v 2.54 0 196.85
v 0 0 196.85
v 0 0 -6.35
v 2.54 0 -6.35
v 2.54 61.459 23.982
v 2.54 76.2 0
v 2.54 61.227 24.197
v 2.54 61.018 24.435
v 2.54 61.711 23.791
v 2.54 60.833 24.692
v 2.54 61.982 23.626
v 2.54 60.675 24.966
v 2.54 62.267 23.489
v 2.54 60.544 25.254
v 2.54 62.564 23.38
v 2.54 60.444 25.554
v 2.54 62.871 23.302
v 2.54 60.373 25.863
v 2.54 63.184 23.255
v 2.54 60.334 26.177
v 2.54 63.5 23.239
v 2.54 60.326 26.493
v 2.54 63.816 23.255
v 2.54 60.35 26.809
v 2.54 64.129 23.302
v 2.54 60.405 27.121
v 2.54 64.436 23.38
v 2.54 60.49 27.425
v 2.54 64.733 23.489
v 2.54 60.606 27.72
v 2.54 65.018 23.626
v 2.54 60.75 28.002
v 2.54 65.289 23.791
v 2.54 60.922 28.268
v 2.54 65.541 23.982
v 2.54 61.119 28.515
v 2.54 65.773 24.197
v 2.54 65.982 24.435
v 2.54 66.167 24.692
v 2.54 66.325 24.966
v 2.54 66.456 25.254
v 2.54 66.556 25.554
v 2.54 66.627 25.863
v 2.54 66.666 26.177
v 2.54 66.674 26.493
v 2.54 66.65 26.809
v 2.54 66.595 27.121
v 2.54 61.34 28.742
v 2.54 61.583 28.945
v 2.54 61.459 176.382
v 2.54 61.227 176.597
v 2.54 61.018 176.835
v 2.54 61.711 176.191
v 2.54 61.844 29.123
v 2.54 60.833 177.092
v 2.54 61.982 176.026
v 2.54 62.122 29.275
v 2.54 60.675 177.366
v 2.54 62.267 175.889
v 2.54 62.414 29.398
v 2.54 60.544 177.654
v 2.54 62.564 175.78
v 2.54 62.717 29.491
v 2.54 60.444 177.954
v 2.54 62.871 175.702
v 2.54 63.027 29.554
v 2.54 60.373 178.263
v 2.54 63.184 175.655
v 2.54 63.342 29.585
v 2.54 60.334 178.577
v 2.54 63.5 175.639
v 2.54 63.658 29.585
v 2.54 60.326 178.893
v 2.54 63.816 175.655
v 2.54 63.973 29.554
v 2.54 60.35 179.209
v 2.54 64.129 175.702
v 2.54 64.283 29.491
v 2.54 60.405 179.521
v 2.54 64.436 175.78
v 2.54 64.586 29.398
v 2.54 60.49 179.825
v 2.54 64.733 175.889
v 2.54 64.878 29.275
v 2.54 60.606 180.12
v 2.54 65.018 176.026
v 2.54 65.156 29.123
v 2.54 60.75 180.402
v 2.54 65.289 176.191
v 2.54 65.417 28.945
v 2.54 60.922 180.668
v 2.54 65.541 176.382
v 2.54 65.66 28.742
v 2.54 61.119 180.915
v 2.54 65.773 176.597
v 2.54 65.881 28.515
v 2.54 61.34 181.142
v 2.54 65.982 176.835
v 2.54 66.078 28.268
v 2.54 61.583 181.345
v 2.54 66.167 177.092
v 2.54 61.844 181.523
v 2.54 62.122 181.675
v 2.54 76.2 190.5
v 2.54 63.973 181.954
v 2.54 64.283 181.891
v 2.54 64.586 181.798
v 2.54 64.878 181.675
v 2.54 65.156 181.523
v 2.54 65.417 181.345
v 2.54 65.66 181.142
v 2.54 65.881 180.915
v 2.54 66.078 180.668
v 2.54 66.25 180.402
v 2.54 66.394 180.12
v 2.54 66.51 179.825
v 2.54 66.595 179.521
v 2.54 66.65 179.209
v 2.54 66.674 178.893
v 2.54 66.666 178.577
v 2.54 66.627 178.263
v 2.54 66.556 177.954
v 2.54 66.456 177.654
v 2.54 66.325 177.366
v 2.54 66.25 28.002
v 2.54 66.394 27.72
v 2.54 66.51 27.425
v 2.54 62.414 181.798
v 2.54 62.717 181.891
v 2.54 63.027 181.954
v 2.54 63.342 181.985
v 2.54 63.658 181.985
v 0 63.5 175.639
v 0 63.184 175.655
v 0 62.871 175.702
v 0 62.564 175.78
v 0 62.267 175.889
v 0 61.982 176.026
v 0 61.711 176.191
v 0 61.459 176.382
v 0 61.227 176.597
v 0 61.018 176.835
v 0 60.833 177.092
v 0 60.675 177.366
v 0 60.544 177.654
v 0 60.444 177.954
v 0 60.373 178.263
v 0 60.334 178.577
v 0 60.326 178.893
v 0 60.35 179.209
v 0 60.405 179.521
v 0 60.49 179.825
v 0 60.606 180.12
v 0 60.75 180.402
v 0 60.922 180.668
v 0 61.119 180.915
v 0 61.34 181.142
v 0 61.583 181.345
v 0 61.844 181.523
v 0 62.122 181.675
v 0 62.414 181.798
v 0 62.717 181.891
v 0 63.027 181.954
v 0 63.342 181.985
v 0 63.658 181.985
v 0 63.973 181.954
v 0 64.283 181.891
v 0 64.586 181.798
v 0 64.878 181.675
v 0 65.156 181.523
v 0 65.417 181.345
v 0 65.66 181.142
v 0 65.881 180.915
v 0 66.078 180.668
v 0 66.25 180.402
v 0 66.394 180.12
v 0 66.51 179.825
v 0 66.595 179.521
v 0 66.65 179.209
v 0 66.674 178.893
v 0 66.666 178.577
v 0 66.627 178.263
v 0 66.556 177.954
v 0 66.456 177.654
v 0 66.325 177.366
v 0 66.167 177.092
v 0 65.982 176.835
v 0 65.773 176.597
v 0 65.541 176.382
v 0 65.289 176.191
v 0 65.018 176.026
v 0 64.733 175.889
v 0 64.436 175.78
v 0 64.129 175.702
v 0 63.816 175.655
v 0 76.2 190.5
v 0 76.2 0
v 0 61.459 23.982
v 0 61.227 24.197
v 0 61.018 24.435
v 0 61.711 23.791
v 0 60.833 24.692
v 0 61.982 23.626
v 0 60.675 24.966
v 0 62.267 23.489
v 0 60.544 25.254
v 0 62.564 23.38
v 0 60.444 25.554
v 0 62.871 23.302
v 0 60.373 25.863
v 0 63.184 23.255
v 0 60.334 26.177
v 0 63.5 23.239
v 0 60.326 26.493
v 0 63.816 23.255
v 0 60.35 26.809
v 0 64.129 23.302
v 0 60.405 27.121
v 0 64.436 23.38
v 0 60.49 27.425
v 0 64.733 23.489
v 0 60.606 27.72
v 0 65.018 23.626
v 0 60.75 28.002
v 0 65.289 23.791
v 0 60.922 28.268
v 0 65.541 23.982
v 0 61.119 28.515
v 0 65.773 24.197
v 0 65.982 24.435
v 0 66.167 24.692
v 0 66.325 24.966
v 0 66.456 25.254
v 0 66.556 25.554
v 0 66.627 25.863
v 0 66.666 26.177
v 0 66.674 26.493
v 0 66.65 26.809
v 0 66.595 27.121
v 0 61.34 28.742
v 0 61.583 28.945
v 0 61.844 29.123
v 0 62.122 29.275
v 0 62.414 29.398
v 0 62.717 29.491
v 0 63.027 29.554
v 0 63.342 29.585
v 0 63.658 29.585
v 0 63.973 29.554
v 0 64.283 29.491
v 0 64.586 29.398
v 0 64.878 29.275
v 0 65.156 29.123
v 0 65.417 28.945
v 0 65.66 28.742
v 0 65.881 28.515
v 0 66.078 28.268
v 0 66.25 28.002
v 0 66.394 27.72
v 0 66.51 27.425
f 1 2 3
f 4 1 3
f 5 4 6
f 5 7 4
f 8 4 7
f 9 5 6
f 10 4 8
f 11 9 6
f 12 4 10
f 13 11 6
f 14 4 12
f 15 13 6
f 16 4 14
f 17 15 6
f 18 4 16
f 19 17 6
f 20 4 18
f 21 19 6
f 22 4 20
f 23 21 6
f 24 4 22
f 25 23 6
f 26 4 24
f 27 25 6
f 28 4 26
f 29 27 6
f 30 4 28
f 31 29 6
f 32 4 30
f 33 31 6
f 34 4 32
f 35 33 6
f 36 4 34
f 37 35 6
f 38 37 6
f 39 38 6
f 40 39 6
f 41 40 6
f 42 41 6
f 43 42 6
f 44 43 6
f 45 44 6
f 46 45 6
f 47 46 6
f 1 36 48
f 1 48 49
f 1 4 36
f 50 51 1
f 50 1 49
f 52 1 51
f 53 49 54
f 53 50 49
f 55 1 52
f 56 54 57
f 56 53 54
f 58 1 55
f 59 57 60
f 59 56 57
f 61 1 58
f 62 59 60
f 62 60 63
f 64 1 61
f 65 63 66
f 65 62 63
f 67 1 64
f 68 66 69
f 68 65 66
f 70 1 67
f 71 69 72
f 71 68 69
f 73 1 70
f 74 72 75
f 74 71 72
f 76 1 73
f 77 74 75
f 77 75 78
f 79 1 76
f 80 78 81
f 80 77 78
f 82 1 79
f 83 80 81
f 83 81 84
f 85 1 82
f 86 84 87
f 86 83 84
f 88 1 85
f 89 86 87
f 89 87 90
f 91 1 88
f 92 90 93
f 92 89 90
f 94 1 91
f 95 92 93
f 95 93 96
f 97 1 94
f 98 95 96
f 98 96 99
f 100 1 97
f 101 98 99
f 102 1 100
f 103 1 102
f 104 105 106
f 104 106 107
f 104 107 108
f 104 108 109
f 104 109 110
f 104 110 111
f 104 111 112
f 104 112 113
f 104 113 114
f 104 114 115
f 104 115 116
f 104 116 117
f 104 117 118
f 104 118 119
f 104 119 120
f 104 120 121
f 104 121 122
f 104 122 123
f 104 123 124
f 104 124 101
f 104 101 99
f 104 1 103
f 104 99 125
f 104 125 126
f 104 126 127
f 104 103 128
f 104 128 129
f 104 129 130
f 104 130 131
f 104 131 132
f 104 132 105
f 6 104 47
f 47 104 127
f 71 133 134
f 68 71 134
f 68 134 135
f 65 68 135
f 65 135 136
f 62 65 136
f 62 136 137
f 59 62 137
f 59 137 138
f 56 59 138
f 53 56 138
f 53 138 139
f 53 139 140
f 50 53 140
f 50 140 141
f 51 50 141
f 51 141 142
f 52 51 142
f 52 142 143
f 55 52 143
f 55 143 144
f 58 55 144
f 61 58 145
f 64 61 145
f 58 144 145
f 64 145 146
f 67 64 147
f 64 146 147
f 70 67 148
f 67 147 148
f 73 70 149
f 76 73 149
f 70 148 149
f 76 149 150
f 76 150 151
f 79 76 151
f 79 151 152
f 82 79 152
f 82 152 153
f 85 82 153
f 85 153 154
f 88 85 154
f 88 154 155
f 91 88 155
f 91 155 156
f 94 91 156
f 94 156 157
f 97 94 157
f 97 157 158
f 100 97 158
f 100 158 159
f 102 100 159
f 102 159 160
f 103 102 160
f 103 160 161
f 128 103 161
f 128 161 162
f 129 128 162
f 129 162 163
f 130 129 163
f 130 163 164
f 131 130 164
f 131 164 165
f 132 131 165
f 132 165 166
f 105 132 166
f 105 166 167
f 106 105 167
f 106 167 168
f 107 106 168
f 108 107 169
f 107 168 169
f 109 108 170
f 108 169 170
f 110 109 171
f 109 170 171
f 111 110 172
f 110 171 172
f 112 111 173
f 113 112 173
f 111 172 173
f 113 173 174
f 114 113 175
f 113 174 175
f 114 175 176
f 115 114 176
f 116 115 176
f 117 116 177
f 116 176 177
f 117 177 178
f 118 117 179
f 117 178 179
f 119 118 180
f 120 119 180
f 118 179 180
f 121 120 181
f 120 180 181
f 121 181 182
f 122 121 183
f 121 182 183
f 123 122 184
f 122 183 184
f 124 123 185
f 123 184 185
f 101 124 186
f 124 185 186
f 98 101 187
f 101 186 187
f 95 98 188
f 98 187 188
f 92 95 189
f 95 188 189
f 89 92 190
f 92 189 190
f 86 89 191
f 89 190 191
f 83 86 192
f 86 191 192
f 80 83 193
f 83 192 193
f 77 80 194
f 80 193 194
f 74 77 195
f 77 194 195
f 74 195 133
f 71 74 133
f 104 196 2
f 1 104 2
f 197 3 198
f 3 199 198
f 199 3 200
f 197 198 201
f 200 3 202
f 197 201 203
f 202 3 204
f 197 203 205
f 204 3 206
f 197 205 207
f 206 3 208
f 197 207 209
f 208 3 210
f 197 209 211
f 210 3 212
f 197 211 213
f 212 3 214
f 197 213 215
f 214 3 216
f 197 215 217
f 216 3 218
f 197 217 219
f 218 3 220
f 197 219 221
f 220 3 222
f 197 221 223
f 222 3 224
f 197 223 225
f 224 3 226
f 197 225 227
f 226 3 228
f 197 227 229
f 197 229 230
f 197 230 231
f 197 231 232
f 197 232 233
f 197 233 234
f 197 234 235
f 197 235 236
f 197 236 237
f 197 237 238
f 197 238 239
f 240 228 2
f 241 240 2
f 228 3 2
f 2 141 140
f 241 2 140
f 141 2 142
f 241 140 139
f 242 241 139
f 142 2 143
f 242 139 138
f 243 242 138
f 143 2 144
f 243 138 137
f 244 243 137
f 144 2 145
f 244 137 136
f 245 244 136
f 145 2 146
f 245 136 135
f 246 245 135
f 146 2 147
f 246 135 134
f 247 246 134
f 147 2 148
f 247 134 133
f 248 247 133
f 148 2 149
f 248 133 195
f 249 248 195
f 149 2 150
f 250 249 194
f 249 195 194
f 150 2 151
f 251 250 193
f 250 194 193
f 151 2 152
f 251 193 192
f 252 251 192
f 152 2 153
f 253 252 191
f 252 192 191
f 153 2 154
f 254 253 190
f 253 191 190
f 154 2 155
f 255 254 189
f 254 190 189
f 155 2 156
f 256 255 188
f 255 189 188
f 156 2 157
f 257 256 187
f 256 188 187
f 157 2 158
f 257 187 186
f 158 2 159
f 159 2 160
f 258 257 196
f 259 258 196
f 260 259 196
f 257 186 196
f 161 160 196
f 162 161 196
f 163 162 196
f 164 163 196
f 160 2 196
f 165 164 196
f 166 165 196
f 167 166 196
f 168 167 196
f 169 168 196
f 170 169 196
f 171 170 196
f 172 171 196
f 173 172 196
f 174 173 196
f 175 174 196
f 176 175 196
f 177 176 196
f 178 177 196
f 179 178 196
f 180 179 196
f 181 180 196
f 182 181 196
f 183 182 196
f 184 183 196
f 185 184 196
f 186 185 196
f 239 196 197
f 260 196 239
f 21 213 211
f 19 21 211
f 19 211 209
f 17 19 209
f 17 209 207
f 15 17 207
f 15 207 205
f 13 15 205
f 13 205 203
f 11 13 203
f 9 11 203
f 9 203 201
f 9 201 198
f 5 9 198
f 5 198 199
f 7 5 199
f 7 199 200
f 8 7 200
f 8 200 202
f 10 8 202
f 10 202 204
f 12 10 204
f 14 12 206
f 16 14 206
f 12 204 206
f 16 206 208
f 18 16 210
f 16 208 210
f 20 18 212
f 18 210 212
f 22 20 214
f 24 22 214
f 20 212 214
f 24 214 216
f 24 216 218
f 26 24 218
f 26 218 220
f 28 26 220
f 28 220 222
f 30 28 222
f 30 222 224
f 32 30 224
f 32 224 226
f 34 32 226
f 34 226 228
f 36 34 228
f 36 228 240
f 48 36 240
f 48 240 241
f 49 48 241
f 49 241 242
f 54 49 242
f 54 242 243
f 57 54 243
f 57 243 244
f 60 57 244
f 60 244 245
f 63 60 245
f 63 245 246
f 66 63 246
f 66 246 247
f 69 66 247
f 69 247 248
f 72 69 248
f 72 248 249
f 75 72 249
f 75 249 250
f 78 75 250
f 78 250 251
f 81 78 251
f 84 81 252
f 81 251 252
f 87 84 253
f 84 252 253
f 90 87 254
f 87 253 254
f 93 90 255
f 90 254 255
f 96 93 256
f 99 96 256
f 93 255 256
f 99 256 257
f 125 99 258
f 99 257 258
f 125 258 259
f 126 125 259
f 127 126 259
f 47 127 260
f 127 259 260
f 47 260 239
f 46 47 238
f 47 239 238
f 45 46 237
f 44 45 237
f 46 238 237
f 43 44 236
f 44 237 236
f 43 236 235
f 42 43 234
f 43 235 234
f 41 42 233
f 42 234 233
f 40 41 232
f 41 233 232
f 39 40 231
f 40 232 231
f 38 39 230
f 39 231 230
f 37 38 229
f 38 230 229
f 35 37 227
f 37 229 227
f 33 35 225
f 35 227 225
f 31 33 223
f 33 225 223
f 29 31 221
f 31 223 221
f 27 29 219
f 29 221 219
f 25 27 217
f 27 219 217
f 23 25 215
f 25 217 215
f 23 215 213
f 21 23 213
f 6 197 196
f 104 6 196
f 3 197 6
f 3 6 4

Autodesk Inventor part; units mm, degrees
ref_plane "YZ Plane" through (0, 0, 0) normal (1, 0, 0) x (0, 1, 0)
ref_plane "XZ Plane" through (0, 0, 0) normal (0, 1, 0) x (-1, 0, 0)
ref_plane "XY Plane" through (0, 0, 0) normal (0, 0, 1) x (1, 0, 0)
sketch "Sketch1" plane through (0, 0, 0) normal (1, 0, 0) x (0, 1, 0)
  line L0 (50.8, 190.5) -> (0, 190.5)
  line L1 (0, 190.5) -> (0, 0)
  line L2 (0, 0) -> (50.8, 0)
  line L3 (50.8, 0) -> (50.8, 190.5)
  line L4 (0, 196.85) -> (50.8, 190.5)
  line L5 (0, 196.85) -> (0, 190.5)
  line L6 (0, 0) -> (50.8, 0)
  line L7 (0, 0) -> (0, 0)
  line L8 (50.8, 0) -> (0, 0)
  line L9 (0, 0) -> (0, 0)
  line L10 (0, -6.35) -> (50.8, 0)
  line L11 (0, -6.35) -> (0, 0)
  line L12 (0, 0) -> (76.2, 0)
  line L13 (76.2, 0) -> (76.2, 190.5)
  line L14 (76.2, 190.5) -> (0, 196.85)
  line L15 (76.2, 0) -> (0, -6.35)
  dimension "d0" = 76.2
extrude "Extrusion1" add sketch "Sketch1" along normal blind 2.54
hole "Hole1" at (2.54, 63.5, 178.8143) direction (-1, 0, 0) diameter 6.35 end through all
pattern_linear "Rectangular Pattern1" count 2 spacing 152.4 along (0, 0, -1) of "Hole1"
properties part number "mountPiece"
